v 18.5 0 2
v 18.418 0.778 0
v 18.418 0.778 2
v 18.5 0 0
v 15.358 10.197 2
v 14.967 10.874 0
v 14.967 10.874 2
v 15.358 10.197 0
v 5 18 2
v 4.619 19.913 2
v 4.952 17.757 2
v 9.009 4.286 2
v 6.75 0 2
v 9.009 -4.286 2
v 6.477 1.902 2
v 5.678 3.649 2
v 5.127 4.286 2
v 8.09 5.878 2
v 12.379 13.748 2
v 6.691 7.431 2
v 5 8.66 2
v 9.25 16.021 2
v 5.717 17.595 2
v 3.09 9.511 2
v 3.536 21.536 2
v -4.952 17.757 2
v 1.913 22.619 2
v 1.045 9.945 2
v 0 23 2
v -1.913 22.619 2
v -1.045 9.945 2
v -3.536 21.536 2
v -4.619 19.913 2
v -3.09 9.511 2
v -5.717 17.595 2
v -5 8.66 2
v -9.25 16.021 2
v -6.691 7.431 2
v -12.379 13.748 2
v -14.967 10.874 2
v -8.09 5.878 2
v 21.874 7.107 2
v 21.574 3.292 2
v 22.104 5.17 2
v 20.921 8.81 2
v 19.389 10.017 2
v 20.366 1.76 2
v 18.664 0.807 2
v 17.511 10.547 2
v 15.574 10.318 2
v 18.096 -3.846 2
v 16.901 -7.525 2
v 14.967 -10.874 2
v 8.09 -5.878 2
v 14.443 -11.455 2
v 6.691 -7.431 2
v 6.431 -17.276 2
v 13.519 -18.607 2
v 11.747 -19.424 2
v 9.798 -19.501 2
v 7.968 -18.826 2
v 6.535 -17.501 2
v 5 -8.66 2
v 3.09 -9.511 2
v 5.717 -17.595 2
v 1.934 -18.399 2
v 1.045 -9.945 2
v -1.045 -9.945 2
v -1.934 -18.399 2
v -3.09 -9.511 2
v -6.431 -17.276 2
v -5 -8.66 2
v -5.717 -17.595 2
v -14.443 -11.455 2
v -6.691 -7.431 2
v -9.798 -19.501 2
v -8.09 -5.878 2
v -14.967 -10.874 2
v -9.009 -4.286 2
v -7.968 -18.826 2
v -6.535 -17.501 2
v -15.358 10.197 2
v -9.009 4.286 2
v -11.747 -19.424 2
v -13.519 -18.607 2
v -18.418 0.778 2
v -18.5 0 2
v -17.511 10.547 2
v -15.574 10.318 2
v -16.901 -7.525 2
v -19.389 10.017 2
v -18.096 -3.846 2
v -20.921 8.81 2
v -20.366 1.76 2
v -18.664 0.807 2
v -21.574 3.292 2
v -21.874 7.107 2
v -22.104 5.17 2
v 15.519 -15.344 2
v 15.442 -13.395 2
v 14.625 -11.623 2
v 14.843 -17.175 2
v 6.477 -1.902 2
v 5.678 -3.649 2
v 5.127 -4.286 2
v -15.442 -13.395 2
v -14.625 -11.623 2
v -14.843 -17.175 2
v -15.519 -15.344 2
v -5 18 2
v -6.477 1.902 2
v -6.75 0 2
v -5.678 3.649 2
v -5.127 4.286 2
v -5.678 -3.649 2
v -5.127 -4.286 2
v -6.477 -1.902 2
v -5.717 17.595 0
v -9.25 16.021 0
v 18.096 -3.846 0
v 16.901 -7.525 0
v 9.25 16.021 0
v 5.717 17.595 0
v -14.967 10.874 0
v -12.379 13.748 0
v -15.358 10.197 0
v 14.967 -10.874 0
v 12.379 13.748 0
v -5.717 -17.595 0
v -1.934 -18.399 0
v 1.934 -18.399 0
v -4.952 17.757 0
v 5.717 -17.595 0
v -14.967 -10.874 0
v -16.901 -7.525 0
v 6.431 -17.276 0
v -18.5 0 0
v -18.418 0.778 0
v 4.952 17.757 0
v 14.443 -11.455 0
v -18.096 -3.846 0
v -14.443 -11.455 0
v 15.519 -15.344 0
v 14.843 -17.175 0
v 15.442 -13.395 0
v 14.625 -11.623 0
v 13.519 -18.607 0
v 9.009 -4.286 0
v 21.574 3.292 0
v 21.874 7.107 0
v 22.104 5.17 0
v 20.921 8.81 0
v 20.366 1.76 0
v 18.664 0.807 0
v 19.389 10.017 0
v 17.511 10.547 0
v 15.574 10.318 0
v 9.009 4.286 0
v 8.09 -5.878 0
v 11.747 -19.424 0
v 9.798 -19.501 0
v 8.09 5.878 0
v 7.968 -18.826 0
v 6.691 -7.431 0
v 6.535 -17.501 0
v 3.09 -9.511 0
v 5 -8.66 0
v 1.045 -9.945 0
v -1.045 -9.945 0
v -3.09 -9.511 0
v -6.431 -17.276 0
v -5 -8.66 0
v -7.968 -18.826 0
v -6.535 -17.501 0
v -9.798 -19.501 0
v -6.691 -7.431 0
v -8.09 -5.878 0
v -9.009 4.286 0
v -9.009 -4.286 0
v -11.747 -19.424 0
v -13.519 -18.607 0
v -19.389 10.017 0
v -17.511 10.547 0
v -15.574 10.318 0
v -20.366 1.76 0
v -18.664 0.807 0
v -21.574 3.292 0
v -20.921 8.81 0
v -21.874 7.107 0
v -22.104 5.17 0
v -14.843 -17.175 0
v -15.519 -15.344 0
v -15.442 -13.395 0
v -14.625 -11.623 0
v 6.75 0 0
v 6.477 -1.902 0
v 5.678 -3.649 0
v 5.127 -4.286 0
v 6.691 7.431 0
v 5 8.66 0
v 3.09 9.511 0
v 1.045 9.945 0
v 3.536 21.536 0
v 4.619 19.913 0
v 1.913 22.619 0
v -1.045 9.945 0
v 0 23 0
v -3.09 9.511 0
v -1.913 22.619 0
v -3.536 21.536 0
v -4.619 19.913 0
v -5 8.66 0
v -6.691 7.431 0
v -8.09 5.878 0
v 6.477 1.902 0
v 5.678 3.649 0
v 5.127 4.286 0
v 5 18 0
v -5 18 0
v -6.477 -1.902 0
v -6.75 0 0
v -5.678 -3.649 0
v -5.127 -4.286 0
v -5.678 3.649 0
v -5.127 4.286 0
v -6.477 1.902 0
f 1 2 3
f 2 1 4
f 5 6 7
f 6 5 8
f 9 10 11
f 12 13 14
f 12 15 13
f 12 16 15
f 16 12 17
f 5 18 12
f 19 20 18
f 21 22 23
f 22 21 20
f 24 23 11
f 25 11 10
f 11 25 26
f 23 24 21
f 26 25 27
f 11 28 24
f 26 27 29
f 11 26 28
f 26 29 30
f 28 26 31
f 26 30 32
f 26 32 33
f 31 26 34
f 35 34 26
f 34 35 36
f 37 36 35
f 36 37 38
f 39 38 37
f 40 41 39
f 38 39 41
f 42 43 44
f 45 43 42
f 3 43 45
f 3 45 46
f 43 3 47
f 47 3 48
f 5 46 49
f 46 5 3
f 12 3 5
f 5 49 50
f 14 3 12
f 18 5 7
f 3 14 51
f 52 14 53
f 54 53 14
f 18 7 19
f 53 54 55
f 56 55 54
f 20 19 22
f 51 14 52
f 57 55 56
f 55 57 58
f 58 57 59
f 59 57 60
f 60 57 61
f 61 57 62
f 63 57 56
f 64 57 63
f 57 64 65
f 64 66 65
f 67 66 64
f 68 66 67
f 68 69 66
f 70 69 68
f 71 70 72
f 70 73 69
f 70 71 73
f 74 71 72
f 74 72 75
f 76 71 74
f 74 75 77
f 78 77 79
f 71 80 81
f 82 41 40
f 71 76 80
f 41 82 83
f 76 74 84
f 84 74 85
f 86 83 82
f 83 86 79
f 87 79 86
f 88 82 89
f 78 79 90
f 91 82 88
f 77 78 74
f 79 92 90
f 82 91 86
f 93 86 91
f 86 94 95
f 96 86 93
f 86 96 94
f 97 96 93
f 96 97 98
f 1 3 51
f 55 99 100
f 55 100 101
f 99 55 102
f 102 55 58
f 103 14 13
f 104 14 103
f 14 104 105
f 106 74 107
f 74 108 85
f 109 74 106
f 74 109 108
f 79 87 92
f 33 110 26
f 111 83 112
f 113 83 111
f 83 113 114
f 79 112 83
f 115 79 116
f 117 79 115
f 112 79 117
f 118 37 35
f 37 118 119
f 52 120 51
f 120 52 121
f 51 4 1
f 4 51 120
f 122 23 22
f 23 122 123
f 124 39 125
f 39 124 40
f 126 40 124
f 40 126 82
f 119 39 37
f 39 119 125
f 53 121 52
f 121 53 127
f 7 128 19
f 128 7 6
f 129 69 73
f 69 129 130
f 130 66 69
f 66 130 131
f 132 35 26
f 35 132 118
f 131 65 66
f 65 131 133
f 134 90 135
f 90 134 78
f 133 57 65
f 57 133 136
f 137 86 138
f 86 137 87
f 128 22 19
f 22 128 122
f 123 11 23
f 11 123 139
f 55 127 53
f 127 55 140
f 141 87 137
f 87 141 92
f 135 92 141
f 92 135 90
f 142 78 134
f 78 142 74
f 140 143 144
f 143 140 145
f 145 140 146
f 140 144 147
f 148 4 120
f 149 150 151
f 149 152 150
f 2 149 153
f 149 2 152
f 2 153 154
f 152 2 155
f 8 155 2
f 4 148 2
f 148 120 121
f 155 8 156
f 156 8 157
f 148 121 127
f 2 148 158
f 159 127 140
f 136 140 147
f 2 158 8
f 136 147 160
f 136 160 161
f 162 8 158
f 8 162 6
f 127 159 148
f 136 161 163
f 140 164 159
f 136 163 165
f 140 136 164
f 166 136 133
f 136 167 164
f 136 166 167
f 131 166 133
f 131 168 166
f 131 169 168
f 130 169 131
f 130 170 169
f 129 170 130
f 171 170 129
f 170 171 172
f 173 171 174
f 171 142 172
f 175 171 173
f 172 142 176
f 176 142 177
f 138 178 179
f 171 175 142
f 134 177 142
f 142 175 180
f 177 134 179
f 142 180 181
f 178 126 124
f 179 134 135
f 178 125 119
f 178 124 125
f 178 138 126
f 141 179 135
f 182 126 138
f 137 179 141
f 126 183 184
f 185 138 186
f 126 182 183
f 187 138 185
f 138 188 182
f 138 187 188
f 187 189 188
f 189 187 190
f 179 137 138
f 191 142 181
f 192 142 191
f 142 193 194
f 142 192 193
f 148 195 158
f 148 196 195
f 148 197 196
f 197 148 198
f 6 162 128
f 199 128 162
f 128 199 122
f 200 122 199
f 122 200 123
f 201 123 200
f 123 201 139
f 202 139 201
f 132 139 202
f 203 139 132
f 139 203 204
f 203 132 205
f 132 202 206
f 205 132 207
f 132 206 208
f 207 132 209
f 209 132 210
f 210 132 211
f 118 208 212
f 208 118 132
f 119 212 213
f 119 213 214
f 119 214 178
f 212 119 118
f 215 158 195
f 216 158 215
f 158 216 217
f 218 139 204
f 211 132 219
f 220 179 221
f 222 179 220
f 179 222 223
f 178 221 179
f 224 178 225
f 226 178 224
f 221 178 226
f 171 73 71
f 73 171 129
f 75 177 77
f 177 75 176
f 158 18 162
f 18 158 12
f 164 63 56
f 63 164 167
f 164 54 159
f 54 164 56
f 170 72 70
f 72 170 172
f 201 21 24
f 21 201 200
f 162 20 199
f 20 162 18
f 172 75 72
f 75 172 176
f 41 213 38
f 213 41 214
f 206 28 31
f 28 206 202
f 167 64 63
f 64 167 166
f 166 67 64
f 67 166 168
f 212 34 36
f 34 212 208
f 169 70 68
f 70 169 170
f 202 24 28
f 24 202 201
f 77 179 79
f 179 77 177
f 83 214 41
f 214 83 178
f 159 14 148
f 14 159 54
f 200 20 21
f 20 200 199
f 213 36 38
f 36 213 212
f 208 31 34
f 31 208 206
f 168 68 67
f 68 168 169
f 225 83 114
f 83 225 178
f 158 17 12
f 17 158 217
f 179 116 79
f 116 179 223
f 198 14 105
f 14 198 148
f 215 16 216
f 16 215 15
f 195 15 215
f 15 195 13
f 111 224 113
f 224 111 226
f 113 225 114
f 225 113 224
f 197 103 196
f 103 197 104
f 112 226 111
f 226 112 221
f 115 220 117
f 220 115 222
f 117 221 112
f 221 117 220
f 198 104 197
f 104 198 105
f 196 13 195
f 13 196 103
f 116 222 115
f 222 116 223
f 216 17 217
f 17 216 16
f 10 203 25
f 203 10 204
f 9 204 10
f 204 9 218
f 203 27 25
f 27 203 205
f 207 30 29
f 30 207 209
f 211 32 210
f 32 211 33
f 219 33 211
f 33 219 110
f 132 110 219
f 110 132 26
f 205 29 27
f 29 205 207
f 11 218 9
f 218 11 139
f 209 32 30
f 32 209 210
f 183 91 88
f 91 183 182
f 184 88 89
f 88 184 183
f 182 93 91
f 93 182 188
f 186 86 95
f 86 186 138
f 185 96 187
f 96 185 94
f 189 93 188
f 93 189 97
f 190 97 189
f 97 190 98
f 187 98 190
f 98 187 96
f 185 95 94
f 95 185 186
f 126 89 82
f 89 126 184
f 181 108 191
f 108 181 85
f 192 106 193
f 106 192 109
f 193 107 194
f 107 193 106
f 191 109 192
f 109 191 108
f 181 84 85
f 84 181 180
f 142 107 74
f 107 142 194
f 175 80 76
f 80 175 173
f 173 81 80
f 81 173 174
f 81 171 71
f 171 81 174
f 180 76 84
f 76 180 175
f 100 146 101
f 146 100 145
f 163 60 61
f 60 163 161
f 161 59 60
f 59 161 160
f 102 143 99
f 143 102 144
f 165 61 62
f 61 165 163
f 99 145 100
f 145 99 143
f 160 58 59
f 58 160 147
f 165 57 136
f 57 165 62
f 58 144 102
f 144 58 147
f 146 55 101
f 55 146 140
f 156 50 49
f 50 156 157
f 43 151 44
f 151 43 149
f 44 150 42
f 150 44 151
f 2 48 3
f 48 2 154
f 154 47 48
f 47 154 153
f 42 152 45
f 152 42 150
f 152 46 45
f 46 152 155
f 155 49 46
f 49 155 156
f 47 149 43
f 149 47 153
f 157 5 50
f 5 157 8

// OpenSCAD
// file: attack-ring-base.scad
thickness = 2;
base_diameter = 35;
core_diameter = 15;

module attack_ring_base() {
    clip_length = base_diameter;
    clip_width = core_diameter / 1.75;

    difference() {
        cylinder(thickness, d = base_diameter + thickness);
        cylinder(thickness, d = core_diameter + 5);
    }
    difference() {
        translate([-clip_length / 2, -clip_width / 2])
        cube([clip_length, clip_width, thickness]);
        cylinder(thickness, d = core_diameter - thickness + 0.5);
    }
}

attack_ring_base();
// main file
use <attack-ring-base.scad>

attack_ring_base();
for (i = [0:4]) {
    rotate(i * 72)
    translate([0, 18])
    cylinder(2, d = 10);
}
